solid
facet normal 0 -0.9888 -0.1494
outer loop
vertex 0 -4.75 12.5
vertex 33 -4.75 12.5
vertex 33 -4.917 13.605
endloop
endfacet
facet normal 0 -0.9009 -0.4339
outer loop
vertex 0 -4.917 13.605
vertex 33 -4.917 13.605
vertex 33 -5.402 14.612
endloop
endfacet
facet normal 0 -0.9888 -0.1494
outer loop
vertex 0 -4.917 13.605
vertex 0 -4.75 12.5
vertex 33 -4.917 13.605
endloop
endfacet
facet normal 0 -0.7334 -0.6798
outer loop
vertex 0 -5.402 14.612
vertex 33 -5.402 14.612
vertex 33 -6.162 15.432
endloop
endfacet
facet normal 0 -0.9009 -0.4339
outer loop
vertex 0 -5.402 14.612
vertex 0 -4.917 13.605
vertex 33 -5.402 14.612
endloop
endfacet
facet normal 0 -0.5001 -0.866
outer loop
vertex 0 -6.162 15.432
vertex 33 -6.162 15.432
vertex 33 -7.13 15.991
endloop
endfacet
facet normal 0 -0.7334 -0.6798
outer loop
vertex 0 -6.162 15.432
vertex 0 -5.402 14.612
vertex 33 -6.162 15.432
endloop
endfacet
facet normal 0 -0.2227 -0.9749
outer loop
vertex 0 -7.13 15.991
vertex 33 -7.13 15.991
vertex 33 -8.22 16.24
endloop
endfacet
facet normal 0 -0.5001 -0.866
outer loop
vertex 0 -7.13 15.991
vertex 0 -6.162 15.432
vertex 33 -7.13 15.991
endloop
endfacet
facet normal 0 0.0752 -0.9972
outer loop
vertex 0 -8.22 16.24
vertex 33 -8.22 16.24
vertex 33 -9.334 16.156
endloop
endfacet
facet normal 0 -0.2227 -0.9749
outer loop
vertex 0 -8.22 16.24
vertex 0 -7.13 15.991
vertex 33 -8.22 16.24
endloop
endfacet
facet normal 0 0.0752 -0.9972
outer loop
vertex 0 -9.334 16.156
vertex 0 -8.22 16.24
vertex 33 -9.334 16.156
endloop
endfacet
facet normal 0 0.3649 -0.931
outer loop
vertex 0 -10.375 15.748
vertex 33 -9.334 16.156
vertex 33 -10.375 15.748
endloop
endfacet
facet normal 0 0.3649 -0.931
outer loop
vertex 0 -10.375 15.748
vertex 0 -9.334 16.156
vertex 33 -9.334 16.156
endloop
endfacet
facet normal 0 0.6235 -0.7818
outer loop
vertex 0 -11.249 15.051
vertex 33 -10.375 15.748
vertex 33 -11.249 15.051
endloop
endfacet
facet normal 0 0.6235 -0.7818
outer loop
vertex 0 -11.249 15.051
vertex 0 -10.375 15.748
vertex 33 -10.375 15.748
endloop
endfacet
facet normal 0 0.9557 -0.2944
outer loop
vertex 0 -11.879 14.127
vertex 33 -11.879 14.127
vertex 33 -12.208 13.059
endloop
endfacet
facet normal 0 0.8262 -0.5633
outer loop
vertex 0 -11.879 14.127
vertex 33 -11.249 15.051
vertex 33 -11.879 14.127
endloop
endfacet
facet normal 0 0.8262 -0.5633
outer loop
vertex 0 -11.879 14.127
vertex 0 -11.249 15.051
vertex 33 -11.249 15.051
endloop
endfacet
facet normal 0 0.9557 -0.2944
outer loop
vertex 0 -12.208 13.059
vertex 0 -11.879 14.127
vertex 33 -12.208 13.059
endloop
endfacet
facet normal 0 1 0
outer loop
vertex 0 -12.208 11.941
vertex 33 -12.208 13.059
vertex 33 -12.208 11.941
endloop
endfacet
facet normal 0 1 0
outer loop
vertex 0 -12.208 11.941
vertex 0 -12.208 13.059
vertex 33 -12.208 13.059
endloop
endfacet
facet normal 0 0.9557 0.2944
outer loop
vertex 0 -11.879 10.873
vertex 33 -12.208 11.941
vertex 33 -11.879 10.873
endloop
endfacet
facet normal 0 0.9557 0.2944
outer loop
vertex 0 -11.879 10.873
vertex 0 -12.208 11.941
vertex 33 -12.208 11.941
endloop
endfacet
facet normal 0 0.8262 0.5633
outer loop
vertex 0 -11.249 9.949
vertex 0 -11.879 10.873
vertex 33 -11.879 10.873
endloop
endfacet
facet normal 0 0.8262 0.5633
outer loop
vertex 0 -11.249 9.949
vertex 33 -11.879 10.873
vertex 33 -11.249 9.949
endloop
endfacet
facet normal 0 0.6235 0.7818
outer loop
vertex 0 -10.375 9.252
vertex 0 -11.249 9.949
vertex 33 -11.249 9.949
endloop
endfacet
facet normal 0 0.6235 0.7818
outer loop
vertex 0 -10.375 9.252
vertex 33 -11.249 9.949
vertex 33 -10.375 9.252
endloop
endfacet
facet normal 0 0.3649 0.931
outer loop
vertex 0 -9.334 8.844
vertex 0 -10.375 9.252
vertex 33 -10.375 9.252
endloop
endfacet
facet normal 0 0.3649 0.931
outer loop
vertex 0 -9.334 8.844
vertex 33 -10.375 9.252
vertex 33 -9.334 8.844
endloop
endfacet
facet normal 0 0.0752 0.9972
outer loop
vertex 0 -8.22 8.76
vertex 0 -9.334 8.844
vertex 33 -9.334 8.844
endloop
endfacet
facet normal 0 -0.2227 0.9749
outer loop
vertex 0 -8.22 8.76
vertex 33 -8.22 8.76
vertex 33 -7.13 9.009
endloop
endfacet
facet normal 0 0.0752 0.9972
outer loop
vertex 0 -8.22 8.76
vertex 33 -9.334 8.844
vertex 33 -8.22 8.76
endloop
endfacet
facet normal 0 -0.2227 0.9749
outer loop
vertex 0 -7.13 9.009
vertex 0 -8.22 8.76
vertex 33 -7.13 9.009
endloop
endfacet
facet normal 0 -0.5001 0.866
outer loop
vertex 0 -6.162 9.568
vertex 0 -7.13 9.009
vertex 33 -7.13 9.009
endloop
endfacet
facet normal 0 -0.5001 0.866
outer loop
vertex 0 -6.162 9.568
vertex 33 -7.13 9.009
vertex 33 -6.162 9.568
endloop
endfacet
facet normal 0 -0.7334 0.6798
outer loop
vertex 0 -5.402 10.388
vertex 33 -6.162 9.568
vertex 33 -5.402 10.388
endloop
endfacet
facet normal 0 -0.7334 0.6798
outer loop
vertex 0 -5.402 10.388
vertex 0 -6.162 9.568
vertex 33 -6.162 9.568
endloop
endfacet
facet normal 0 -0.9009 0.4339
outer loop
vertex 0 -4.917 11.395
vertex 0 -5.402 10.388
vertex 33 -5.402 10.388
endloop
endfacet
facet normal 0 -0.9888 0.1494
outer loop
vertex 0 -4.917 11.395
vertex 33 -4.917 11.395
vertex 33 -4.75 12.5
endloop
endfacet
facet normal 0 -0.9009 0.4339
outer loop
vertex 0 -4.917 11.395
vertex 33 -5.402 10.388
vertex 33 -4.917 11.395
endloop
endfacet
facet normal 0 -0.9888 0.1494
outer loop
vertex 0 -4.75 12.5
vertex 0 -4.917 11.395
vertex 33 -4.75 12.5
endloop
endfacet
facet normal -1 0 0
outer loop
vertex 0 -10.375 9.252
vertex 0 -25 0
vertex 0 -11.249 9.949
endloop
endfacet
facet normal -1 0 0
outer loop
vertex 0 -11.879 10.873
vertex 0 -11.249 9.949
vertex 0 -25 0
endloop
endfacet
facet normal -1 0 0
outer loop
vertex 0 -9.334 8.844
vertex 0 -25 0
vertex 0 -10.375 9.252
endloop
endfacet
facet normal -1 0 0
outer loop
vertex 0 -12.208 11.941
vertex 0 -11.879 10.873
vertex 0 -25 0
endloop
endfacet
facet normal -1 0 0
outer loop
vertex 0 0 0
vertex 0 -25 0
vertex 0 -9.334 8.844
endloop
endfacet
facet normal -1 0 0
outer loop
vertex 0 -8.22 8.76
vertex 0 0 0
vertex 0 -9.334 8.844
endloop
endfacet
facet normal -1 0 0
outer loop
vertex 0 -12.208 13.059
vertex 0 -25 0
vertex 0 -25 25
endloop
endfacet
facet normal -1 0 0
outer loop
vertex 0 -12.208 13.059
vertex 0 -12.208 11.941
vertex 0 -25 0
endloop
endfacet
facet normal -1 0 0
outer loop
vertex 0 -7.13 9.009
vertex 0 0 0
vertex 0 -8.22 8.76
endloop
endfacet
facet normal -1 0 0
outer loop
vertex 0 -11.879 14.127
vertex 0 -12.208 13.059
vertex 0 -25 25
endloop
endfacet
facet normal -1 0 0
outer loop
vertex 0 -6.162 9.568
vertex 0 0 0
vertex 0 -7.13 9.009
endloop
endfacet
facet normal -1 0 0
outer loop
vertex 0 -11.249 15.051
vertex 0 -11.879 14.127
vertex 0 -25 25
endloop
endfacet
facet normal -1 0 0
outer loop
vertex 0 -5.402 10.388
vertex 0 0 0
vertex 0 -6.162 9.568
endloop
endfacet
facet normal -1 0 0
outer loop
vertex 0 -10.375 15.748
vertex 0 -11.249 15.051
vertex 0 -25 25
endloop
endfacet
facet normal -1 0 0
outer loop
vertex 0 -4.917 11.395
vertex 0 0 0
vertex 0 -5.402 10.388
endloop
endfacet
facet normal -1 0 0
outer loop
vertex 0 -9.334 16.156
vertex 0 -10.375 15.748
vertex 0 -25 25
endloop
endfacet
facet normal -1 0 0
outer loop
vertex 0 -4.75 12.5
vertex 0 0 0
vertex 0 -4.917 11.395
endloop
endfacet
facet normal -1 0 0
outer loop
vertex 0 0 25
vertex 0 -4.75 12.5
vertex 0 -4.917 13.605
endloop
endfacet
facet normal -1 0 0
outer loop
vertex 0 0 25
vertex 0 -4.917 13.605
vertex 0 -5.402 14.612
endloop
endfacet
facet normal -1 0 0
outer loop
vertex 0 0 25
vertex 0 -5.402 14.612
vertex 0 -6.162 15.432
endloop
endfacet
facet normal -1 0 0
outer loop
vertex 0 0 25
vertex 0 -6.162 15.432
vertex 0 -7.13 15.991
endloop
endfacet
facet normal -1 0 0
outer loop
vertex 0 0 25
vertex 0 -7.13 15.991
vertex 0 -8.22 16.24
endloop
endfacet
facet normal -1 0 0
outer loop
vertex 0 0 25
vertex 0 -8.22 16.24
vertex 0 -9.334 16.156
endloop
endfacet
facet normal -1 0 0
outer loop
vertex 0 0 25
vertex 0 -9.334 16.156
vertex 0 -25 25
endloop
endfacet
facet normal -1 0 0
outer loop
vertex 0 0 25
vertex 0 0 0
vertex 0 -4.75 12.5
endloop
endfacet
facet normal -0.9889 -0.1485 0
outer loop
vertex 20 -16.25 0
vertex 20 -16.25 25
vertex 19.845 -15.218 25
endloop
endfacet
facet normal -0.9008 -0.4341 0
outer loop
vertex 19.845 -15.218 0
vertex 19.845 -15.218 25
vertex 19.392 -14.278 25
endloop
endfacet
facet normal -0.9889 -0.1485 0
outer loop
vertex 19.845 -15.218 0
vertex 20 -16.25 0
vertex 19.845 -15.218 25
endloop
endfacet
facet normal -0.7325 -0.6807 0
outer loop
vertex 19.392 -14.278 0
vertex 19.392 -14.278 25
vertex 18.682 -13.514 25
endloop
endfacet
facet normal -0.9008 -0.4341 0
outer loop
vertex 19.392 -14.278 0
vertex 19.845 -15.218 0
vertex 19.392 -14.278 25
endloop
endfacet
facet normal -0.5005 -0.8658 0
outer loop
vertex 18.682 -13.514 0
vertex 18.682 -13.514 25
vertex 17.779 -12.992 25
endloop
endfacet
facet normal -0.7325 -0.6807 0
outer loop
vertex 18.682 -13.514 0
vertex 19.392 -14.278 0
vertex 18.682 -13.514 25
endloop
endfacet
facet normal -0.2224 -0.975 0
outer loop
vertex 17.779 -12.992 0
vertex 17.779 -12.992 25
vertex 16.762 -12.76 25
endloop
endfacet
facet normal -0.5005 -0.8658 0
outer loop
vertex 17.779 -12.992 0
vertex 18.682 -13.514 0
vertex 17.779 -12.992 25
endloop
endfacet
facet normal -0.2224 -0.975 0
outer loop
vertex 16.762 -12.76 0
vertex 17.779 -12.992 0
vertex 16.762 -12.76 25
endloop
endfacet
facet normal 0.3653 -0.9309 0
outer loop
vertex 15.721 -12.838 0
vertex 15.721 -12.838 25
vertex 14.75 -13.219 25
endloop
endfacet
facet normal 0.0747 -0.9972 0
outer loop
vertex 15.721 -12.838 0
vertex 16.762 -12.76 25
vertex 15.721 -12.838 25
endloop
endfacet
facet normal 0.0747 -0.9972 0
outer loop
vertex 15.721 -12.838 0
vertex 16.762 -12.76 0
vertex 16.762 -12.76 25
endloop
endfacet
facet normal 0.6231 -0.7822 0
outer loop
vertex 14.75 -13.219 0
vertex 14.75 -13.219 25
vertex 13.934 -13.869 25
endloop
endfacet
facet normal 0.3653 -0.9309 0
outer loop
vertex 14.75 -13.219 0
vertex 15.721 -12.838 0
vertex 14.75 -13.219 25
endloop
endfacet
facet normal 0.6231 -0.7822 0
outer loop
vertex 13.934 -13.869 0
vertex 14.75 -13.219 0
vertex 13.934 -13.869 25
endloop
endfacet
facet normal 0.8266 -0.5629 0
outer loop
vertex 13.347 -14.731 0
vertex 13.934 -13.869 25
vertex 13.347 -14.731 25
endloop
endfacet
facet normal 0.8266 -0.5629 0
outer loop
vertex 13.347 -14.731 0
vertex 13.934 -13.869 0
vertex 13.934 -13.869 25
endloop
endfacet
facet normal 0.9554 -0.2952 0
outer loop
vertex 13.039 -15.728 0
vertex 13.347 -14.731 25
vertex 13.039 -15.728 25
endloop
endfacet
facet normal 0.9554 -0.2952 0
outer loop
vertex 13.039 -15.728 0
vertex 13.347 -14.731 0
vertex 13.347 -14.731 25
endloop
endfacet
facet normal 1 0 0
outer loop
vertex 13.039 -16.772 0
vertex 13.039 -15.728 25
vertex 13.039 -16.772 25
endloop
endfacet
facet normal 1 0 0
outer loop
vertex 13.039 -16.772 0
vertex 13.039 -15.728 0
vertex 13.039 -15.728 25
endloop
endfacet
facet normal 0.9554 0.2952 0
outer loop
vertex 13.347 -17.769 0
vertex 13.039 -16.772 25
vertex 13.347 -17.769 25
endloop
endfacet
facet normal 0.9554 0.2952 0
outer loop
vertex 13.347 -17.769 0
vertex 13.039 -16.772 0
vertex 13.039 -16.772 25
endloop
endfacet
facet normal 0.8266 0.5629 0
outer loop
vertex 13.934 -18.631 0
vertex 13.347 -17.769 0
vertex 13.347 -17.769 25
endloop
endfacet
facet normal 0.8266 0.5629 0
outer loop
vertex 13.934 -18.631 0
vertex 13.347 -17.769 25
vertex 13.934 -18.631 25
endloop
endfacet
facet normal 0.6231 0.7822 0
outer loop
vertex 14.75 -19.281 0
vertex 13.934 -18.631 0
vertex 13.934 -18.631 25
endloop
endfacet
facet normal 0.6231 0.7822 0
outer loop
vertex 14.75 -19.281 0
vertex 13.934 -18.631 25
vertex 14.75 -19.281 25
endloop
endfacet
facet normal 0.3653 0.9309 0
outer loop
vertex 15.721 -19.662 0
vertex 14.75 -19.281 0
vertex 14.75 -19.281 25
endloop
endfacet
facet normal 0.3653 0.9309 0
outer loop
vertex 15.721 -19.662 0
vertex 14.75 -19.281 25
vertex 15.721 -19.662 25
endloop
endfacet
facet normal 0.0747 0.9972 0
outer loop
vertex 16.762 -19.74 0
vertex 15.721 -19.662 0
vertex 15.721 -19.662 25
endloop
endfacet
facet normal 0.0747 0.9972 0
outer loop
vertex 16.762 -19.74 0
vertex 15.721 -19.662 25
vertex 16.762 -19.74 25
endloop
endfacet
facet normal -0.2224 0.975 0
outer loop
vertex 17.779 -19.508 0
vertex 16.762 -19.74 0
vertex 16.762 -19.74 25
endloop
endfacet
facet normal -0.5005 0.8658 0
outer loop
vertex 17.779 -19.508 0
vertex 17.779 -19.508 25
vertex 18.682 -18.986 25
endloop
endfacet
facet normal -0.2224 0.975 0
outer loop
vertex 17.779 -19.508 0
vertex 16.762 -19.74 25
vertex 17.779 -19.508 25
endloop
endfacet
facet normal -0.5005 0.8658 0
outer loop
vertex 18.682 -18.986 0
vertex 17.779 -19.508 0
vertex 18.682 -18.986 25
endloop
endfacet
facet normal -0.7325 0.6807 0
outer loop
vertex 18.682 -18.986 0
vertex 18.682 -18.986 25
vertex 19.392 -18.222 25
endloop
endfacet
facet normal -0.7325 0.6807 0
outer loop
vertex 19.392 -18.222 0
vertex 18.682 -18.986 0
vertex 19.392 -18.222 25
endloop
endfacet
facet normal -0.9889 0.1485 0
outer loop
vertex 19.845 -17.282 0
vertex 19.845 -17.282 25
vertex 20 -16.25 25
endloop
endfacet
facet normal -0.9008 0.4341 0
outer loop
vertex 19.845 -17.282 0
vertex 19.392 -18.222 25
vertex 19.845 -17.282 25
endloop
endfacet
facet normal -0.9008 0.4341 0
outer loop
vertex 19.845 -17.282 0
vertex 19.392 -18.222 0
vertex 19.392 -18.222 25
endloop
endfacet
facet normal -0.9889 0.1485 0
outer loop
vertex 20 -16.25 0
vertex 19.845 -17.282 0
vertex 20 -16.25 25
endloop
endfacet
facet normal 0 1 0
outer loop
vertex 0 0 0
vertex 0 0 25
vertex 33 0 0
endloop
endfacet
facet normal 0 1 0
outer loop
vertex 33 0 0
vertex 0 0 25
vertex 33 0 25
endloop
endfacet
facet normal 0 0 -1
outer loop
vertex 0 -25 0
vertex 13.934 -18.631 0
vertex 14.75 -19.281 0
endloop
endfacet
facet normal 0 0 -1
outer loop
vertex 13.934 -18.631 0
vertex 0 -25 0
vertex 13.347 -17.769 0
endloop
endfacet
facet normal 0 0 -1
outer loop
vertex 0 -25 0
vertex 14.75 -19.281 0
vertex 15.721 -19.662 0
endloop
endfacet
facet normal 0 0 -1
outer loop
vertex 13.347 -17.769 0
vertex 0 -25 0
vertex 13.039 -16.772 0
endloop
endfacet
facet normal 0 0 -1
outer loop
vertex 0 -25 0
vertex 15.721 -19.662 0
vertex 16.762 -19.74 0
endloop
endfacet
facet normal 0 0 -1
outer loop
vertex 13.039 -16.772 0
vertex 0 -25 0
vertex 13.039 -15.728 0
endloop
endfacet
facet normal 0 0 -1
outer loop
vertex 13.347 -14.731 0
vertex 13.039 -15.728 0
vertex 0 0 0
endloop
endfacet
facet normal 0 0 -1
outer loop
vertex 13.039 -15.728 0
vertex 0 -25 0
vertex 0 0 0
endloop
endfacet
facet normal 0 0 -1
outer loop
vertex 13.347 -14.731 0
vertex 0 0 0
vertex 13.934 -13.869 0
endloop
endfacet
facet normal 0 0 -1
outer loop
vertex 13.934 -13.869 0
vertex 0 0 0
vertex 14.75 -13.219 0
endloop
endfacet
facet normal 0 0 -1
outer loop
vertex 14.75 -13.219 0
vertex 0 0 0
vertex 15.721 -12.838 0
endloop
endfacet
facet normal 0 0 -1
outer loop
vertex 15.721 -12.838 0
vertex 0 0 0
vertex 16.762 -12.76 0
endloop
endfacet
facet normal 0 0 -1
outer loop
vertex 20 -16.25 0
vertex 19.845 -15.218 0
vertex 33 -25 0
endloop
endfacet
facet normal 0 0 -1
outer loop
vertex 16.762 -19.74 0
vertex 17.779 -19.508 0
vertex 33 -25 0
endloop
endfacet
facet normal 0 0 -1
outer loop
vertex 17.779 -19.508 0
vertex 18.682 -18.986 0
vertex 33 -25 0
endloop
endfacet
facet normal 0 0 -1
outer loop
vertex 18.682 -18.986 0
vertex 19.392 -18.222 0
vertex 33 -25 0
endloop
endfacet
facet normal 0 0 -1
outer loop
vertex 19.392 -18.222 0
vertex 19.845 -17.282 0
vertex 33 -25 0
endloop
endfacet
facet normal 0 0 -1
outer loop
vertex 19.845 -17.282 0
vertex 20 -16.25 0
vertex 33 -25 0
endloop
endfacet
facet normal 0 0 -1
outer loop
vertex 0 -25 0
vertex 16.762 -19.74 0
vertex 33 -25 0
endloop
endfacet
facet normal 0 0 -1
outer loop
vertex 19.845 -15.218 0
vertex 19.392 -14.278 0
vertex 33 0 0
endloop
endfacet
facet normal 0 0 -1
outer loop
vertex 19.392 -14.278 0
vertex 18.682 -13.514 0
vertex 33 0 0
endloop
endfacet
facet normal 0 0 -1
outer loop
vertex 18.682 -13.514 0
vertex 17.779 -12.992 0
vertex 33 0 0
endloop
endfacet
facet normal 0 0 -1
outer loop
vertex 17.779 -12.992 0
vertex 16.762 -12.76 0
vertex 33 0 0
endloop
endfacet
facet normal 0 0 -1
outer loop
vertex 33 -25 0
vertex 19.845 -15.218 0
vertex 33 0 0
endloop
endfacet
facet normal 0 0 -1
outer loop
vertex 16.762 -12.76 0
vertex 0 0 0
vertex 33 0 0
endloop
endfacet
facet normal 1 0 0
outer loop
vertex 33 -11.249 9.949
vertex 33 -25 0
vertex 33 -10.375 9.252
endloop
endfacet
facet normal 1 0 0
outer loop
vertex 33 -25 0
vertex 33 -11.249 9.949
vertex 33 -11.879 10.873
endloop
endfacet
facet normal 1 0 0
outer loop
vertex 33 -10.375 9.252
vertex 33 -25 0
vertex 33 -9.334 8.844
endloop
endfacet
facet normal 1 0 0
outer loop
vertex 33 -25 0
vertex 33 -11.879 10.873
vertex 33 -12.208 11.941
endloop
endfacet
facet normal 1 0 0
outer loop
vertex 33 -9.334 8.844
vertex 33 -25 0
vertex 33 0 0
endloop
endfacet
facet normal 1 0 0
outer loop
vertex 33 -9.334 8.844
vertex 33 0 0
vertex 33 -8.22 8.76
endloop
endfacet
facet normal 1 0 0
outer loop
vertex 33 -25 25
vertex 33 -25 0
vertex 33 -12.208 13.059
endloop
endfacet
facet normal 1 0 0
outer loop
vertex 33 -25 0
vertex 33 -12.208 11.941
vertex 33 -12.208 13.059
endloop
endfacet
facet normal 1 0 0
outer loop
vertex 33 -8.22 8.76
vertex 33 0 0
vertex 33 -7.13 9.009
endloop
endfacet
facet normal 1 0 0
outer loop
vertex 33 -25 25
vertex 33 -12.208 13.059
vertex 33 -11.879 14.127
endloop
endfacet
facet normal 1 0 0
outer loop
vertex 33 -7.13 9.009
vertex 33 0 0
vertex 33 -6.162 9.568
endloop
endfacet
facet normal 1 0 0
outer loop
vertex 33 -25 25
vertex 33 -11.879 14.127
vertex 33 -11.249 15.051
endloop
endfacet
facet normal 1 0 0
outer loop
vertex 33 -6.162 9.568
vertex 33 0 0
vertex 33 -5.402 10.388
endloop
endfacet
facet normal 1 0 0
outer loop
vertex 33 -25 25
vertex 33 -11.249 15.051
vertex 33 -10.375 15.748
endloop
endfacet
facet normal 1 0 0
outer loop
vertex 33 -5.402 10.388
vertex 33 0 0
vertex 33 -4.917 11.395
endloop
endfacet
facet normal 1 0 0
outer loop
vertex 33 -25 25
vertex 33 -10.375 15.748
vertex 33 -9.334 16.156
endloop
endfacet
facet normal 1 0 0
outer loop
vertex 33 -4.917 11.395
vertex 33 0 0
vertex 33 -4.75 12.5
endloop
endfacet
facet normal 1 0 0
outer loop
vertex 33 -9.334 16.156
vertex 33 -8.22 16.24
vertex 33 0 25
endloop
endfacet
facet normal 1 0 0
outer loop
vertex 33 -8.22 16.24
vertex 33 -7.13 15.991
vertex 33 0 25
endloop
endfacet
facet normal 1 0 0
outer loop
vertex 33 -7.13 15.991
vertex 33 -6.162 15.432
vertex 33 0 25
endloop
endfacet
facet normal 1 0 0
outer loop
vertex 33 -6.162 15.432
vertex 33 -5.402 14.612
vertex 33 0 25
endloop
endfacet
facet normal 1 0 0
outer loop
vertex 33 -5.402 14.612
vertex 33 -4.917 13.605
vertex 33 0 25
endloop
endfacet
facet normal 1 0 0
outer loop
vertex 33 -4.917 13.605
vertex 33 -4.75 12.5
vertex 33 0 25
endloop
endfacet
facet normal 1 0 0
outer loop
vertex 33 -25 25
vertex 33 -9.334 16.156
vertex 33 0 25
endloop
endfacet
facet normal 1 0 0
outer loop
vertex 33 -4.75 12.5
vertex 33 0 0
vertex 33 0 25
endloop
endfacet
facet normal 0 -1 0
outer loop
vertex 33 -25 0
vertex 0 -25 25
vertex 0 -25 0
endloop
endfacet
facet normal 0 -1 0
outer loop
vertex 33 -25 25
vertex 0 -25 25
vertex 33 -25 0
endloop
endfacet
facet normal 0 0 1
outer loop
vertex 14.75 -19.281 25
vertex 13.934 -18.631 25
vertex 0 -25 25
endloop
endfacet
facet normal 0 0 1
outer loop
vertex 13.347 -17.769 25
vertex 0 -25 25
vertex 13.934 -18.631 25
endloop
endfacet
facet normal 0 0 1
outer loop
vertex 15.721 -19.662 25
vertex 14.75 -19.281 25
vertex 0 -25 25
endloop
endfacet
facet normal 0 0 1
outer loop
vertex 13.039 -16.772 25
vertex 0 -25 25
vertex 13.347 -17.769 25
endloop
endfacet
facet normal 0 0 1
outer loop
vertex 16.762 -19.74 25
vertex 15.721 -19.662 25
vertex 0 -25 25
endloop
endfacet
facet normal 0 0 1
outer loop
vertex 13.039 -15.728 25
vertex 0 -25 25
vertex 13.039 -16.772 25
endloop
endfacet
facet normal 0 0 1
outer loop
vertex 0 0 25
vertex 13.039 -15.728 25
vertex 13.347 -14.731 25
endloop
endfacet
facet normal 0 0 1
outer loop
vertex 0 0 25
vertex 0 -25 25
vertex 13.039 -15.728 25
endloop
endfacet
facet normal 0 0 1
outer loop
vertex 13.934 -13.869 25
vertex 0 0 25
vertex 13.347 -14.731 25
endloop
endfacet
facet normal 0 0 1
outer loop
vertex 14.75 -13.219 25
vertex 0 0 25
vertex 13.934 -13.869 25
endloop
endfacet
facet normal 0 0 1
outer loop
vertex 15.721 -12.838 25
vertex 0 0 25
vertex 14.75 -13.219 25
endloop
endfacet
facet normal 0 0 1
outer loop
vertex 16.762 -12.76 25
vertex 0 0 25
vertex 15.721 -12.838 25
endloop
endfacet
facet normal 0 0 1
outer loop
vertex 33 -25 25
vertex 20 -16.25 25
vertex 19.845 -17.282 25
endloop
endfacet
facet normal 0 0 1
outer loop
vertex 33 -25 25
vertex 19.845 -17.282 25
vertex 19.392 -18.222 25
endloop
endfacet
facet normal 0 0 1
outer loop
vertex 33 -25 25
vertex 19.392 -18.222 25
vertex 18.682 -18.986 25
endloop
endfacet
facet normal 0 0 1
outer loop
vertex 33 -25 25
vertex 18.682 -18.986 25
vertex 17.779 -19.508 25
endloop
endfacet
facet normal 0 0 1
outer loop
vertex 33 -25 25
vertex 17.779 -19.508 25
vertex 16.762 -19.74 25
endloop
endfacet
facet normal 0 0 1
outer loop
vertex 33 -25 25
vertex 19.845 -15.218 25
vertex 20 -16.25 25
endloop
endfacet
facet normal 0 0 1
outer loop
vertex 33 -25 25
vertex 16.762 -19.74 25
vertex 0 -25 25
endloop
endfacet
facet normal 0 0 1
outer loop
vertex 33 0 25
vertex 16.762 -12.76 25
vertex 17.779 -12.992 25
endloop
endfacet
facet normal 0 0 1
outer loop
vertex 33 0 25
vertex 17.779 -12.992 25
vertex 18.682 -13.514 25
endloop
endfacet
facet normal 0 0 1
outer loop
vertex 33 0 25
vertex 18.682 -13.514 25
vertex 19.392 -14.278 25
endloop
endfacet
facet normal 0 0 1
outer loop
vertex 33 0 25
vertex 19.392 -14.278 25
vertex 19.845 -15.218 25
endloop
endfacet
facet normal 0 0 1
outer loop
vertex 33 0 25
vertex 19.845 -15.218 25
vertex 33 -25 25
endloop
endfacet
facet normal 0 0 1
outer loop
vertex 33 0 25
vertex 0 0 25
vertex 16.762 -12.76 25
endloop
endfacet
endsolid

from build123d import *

# Parameters (mm, degrees)
F0_W     = 33
F0_H     = 25
F1_DEPTH = 25
F2_R     = 3.5
F3_DEPTH = 25.001
F4_R     = 3.75
F5_DEPTH = 33.001


with BuildPart() as f1:
    # F0 (on Front) → F1 (new body)
    with BuildSketch(Plane.XZ):
        with Locations((16.5, 12.5)):
            Rectangle(F0_W, F0_H)
    extrude(amount=F1_DEPTH)

    # F2 (on Top) → F3 (cut, through all)
    with BuildSketch(Plane.XY):
        with Locations((16.5, -16.25)):
            Circle(F2_R)
    extrude(amount=F3_DEPTH, mode=Mode.SUBTRACT)

    # F4 (on Right) → F5 (cut, through all)
    with BuildSketch(Plane.YZ):
        with Locations((-8.5, 12.5)):
            Circle(F4_R)
    extrude(amount=F5_DEPTH, mode=Mode.SUBTRACT)


solid = f1.part
